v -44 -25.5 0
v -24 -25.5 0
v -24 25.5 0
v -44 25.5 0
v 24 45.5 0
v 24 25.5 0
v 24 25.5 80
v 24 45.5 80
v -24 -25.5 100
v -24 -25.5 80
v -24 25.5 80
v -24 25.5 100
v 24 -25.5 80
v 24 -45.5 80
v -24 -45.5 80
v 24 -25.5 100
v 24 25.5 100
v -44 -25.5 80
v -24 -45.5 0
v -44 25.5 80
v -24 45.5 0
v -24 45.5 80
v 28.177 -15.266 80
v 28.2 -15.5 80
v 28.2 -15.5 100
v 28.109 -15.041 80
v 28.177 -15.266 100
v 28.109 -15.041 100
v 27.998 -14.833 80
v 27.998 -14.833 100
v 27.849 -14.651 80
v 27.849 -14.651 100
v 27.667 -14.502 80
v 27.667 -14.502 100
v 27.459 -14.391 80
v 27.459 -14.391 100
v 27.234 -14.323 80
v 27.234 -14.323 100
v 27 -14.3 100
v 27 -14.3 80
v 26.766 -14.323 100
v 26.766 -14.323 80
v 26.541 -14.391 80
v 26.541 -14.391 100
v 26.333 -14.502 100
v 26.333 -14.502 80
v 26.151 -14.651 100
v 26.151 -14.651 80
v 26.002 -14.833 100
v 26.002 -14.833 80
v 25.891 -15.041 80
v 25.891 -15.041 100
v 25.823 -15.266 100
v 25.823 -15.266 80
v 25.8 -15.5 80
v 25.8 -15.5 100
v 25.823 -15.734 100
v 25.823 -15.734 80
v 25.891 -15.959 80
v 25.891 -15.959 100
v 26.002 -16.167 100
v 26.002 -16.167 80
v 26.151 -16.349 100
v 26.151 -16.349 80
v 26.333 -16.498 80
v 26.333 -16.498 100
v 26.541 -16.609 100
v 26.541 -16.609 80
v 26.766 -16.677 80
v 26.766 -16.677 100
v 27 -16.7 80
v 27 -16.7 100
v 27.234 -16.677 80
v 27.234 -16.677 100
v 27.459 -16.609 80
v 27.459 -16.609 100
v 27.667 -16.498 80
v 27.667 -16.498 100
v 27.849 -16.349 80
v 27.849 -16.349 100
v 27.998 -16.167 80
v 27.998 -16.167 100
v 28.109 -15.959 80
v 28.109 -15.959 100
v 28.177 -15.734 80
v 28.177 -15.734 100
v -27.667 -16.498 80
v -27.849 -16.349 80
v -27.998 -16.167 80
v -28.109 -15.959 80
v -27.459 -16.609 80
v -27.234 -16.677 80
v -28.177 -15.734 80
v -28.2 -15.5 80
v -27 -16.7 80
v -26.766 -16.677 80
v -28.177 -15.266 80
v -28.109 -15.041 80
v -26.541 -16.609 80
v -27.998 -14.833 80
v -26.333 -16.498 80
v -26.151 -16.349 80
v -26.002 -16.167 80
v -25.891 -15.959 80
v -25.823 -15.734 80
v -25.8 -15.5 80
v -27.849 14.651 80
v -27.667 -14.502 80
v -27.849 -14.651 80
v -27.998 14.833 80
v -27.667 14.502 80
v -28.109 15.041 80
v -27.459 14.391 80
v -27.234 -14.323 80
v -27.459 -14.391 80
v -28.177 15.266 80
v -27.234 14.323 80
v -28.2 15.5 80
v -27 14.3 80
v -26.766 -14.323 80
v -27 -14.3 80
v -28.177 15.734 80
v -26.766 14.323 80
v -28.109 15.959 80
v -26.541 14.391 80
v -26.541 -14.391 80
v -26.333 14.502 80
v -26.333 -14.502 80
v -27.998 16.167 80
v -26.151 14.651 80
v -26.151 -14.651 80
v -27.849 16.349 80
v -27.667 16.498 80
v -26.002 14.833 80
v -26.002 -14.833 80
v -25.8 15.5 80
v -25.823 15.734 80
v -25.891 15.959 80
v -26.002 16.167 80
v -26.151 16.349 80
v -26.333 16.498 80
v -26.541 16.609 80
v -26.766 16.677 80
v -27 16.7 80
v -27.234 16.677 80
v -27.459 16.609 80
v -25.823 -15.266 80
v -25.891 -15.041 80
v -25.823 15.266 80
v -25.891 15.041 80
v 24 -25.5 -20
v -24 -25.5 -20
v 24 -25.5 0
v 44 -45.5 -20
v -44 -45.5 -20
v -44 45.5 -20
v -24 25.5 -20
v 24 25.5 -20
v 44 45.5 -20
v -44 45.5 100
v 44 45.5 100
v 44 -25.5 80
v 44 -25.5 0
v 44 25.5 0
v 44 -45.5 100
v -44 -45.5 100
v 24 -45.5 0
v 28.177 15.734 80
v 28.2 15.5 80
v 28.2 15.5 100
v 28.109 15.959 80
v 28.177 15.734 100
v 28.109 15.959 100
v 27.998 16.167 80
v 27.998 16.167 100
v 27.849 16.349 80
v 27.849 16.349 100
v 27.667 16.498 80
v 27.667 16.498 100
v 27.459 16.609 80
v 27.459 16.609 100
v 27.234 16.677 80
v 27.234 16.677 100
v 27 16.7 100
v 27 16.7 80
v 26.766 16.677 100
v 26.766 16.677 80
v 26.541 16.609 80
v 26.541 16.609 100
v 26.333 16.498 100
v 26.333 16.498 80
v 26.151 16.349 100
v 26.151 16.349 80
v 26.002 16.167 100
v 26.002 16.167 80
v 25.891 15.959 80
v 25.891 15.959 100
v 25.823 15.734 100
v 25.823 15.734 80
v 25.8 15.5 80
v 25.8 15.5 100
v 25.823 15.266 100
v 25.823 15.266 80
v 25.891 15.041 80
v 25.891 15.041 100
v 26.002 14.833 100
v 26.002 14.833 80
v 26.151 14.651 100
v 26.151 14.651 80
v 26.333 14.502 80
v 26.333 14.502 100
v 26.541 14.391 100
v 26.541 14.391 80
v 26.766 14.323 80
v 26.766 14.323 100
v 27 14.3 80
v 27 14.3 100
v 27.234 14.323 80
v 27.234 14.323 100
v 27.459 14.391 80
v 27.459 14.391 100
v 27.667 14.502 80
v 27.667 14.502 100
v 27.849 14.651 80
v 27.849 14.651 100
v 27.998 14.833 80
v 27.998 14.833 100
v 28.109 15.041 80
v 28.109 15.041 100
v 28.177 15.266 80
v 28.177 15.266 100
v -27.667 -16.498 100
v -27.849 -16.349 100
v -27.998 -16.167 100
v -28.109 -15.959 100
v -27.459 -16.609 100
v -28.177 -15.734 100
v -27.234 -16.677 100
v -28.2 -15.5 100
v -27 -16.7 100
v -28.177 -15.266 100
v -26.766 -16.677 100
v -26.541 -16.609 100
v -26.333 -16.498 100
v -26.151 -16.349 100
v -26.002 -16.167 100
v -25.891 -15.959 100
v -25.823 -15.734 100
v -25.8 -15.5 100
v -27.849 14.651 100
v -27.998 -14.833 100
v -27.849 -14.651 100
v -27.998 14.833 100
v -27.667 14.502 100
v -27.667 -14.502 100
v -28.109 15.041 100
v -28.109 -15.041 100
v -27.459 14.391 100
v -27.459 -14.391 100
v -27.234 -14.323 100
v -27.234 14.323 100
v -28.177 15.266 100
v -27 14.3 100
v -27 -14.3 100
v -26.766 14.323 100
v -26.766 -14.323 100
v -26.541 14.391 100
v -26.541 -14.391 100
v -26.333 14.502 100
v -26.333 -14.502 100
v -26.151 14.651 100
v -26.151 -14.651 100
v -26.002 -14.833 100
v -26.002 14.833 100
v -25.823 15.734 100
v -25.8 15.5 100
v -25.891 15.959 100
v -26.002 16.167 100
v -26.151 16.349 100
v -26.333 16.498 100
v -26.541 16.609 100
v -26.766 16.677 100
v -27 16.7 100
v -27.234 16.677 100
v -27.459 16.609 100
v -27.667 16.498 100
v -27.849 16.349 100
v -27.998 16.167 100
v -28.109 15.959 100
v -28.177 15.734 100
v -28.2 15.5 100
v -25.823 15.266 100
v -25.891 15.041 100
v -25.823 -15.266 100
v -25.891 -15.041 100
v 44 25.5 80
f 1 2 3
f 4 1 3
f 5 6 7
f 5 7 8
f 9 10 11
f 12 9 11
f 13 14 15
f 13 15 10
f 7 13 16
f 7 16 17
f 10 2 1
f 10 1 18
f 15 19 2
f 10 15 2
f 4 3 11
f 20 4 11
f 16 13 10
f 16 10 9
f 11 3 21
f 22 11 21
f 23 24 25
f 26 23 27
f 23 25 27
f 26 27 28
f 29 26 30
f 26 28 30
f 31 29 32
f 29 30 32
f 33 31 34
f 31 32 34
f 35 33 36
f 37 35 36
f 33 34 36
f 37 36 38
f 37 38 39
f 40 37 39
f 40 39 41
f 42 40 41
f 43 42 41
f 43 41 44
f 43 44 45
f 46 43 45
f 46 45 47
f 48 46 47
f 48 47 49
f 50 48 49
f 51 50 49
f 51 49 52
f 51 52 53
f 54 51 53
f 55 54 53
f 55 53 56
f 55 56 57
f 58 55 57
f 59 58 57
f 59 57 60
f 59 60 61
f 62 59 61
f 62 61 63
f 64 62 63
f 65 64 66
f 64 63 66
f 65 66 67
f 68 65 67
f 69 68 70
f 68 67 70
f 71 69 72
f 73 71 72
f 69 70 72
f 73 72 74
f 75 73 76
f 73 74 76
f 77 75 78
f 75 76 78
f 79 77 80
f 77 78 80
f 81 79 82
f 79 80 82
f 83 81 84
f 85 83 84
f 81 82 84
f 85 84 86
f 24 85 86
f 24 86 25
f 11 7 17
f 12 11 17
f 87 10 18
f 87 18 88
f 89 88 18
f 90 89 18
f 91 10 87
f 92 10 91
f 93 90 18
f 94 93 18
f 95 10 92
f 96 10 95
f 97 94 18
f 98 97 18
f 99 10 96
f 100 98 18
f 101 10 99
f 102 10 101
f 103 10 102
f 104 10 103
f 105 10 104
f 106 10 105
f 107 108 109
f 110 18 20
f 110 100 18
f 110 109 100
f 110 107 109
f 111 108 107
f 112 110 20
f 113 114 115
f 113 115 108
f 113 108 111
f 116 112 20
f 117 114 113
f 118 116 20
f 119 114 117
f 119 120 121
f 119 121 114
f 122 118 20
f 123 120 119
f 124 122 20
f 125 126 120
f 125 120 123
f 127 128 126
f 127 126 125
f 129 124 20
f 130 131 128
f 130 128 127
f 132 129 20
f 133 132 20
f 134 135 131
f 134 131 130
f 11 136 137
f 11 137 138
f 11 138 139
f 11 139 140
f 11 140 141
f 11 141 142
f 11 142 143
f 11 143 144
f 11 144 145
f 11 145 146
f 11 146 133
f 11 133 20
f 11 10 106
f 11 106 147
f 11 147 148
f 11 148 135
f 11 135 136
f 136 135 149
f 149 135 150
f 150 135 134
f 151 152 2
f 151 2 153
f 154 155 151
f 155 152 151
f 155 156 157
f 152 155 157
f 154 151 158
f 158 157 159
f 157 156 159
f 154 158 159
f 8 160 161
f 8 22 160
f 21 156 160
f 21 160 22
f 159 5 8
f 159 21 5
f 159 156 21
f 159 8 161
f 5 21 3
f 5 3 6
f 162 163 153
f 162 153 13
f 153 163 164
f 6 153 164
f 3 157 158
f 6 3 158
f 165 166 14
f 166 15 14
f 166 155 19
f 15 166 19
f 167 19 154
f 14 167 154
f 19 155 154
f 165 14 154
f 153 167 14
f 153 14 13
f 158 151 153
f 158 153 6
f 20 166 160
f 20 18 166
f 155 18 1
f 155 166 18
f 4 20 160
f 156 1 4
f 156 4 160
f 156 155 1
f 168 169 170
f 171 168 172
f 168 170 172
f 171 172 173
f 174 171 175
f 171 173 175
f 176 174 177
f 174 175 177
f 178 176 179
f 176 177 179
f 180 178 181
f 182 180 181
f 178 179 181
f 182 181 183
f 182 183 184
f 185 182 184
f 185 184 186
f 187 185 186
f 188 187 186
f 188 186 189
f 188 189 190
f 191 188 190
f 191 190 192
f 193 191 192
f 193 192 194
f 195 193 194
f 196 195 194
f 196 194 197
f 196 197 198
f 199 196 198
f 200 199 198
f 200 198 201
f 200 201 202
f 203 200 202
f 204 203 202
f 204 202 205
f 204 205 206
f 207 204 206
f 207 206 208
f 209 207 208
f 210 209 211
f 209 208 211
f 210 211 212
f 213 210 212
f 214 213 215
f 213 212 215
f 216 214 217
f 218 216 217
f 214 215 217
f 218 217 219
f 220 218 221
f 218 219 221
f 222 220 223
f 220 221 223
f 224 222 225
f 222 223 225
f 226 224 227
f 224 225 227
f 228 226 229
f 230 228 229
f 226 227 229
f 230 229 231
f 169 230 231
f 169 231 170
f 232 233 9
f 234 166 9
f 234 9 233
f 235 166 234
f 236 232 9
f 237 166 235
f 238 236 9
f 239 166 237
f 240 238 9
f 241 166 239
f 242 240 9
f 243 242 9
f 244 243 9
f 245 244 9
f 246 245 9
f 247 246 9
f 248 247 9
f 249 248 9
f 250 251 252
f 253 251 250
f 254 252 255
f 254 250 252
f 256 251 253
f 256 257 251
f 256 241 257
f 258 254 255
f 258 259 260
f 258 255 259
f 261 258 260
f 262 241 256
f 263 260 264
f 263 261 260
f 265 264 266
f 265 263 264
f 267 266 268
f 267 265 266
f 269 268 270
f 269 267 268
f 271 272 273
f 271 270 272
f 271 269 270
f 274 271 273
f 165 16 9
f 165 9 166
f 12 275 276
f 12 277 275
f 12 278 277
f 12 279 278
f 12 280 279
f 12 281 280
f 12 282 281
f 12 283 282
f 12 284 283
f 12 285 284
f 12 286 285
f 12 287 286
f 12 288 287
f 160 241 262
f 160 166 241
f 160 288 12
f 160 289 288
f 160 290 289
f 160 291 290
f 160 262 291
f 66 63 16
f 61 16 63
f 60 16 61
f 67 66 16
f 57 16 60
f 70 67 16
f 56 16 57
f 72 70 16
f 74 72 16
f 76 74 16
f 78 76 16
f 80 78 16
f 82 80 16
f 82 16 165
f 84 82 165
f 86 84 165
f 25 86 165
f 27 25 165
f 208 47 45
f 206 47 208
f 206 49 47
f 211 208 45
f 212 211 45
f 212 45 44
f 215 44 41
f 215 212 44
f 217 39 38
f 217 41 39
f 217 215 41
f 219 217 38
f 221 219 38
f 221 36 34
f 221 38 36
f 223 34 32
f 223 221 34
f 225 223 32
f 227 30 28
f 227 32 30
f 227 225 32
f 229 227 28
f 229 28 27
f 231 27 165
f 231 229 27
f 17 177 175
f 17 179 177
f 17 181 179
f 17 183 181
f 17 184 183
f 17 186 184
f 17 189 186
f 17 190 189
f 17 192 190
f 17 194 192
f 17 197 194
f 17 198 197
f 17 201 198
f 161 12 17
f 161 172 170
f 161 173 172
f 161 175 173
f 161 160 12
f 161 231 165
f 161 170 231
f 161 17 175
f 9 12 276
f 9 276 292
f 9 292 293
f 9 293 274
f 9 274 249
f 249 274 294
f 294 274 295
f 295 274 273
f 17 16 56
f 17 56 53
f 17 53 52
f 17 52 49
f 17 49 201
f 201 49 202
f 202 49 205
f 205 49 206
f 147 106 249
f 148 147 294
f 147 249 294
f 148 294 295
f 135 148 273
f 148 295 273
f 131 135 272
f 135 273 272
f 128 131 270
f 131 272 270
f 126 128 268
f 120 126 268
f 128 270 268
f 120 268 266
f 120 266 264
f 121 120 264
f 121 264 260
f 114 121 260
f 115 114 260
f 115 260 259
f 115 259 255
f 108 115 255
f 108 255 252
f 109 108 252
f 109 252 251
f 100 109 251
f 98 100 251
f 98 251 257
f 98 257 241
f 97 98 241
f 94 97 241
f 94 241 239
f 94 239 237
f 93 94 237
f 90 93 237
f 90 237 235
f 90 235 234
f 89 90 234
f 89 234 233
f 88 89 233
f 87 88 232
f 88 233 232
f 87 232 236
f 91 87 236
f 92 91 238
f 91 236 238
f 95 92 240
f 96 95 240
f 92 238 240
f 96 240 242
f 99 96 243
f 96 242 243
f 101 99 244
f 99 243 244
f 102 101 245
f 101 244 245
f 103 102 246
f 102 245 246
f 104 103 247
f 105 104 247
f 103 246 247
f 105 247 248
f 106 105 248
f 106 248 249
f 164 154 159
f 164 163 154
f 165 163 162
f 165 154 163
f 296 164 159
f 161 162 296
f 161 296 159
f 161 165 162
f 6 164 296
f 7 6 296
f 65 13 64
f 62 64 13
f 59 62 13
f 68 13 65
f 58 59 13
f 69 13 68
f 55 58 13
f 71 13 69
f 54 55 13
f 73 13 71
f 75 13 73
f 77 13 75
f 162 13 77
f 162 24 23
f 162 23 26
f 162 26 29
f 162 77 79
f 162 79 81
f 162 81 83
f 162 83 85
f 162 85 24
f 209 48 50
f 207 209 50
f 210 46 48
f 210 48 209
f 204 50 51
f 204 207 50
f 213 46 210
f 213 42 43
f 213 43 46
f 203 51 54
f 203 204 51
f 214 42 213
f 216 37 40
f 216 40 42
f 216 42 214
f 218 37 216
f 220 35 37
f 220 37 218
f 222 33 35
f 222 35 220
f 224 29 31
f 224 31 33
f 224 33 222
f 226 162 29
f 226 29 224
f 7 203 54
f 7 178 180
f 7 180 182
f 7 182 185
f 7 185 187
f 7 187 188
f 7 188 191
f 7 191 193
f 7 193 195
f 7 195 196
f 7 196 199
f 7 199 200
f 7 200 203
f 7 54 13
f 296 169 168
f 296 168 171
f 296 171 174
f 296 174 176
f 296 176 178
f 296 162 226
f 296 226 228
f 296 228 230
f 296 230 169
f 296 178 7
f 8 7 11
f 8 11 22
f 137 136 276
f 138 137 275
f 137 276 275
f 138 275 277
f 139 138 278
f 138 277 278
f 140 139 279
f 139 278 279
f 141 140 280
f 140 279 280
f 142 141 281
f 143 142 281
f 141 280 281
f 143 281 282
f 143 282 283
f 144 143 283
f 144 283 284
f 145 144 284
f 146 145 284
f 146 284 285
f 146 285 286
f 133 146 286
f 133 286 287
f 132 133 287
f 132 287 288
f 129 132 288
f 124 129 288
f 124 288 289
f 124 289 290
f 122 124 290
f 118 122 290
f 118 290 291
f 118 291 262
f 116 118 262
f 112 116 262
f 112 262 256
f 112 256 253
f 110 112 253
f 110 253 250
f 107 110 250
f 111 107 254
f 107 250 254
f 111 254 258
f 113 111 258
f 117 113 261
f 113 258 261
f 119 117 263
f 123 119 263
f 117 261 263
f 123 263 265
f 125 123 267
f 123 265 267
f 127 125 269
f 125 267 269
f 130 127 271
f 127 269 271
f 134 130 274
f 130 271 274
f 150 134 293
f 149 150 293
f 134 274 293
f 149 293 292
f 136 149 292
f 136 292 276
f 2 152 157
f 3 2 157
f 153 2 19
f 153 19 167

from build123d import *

# Parameters (mm, degrees)
F0_W      = 88
F0_H      = 91
F1_DEPTH  = 20
F2_W      = 20
F2_H      = 91
F3_DEPTH  = 100
F5_W      = 20
F5_H      = 20
F6_DEPTH  = 70
F7_R      = 1.2
F8_DEPTH  = 25
F9_W      = 48
F9_H      = 51
F10_DEPTH = 25
F11_W     = 51
F11_H     = 80
F12_DEPTH = 88.001


with BuildPart() as f1:
    # F0 (on Top) → F1 (new body)
    with BuildSketch(Plane.XY):
        Rectangle(F0_W, F0_H)
    extrude(amount=-F1_DEPTH)

    # F2 (on face) → F3 (join)
    with BuildSketch(Plane.XY):
        with Locations((-34, 0)):
            Rectangle(F2_W, F2_H)
        with Locations((34, 0)):
            Rectangle(F2_W, F2_H)
    extrude(amount=F3_DEPTH)

    # F5 (on face) → F6 (join)
    with BuildSketch(Plane.YZ.offset(44)):
        with Locations((-35.5, 90)):
            Rectangle(F5_W, F5_H)
        with Locations((35.5, 90)):
            Rectangle(F5_W, F5_H)
    extrude(amount=-F6_DEPTH)

    # F7 (on face) → F8 (cut)
    with BuildSketch(Plane.XY.offset(100)):
        with Locations((-27, 15.5)):
            Circle(F7_R)
        with Locations((-27, -15.5)):
            Circle(F7_R)
        with Locations((27, 15.5)):
            Circle(F7_R)
        with Locations((27, -15.5)):
            Circle(F7_R)
    extrude(amount=-F8_DEPTH, mode=Mode.SUBTRACT)

    # F9 (on face) → F10 (cut)
    with BuildSketch(Plane(origin=(0, 0, -20), x_dir=(1, 0, 0), z_dir=(0, 0, -1))):
        Rectangle(F9_W, F9_H)
    extrude(amount=-F10_DEPTH, mode=Mode.SUBTRACT)

    # F11 (on face) → F12 (cut, through all)
    with BuildSketch(Plane.YZ.offset(44)):
        with Locations((0, 40)):
            Rectangle(F11_W, F11_H)
    extrude(amount=-F12_DEPTH, mode=Mode.SUBTRACT)


solid = f1.part
